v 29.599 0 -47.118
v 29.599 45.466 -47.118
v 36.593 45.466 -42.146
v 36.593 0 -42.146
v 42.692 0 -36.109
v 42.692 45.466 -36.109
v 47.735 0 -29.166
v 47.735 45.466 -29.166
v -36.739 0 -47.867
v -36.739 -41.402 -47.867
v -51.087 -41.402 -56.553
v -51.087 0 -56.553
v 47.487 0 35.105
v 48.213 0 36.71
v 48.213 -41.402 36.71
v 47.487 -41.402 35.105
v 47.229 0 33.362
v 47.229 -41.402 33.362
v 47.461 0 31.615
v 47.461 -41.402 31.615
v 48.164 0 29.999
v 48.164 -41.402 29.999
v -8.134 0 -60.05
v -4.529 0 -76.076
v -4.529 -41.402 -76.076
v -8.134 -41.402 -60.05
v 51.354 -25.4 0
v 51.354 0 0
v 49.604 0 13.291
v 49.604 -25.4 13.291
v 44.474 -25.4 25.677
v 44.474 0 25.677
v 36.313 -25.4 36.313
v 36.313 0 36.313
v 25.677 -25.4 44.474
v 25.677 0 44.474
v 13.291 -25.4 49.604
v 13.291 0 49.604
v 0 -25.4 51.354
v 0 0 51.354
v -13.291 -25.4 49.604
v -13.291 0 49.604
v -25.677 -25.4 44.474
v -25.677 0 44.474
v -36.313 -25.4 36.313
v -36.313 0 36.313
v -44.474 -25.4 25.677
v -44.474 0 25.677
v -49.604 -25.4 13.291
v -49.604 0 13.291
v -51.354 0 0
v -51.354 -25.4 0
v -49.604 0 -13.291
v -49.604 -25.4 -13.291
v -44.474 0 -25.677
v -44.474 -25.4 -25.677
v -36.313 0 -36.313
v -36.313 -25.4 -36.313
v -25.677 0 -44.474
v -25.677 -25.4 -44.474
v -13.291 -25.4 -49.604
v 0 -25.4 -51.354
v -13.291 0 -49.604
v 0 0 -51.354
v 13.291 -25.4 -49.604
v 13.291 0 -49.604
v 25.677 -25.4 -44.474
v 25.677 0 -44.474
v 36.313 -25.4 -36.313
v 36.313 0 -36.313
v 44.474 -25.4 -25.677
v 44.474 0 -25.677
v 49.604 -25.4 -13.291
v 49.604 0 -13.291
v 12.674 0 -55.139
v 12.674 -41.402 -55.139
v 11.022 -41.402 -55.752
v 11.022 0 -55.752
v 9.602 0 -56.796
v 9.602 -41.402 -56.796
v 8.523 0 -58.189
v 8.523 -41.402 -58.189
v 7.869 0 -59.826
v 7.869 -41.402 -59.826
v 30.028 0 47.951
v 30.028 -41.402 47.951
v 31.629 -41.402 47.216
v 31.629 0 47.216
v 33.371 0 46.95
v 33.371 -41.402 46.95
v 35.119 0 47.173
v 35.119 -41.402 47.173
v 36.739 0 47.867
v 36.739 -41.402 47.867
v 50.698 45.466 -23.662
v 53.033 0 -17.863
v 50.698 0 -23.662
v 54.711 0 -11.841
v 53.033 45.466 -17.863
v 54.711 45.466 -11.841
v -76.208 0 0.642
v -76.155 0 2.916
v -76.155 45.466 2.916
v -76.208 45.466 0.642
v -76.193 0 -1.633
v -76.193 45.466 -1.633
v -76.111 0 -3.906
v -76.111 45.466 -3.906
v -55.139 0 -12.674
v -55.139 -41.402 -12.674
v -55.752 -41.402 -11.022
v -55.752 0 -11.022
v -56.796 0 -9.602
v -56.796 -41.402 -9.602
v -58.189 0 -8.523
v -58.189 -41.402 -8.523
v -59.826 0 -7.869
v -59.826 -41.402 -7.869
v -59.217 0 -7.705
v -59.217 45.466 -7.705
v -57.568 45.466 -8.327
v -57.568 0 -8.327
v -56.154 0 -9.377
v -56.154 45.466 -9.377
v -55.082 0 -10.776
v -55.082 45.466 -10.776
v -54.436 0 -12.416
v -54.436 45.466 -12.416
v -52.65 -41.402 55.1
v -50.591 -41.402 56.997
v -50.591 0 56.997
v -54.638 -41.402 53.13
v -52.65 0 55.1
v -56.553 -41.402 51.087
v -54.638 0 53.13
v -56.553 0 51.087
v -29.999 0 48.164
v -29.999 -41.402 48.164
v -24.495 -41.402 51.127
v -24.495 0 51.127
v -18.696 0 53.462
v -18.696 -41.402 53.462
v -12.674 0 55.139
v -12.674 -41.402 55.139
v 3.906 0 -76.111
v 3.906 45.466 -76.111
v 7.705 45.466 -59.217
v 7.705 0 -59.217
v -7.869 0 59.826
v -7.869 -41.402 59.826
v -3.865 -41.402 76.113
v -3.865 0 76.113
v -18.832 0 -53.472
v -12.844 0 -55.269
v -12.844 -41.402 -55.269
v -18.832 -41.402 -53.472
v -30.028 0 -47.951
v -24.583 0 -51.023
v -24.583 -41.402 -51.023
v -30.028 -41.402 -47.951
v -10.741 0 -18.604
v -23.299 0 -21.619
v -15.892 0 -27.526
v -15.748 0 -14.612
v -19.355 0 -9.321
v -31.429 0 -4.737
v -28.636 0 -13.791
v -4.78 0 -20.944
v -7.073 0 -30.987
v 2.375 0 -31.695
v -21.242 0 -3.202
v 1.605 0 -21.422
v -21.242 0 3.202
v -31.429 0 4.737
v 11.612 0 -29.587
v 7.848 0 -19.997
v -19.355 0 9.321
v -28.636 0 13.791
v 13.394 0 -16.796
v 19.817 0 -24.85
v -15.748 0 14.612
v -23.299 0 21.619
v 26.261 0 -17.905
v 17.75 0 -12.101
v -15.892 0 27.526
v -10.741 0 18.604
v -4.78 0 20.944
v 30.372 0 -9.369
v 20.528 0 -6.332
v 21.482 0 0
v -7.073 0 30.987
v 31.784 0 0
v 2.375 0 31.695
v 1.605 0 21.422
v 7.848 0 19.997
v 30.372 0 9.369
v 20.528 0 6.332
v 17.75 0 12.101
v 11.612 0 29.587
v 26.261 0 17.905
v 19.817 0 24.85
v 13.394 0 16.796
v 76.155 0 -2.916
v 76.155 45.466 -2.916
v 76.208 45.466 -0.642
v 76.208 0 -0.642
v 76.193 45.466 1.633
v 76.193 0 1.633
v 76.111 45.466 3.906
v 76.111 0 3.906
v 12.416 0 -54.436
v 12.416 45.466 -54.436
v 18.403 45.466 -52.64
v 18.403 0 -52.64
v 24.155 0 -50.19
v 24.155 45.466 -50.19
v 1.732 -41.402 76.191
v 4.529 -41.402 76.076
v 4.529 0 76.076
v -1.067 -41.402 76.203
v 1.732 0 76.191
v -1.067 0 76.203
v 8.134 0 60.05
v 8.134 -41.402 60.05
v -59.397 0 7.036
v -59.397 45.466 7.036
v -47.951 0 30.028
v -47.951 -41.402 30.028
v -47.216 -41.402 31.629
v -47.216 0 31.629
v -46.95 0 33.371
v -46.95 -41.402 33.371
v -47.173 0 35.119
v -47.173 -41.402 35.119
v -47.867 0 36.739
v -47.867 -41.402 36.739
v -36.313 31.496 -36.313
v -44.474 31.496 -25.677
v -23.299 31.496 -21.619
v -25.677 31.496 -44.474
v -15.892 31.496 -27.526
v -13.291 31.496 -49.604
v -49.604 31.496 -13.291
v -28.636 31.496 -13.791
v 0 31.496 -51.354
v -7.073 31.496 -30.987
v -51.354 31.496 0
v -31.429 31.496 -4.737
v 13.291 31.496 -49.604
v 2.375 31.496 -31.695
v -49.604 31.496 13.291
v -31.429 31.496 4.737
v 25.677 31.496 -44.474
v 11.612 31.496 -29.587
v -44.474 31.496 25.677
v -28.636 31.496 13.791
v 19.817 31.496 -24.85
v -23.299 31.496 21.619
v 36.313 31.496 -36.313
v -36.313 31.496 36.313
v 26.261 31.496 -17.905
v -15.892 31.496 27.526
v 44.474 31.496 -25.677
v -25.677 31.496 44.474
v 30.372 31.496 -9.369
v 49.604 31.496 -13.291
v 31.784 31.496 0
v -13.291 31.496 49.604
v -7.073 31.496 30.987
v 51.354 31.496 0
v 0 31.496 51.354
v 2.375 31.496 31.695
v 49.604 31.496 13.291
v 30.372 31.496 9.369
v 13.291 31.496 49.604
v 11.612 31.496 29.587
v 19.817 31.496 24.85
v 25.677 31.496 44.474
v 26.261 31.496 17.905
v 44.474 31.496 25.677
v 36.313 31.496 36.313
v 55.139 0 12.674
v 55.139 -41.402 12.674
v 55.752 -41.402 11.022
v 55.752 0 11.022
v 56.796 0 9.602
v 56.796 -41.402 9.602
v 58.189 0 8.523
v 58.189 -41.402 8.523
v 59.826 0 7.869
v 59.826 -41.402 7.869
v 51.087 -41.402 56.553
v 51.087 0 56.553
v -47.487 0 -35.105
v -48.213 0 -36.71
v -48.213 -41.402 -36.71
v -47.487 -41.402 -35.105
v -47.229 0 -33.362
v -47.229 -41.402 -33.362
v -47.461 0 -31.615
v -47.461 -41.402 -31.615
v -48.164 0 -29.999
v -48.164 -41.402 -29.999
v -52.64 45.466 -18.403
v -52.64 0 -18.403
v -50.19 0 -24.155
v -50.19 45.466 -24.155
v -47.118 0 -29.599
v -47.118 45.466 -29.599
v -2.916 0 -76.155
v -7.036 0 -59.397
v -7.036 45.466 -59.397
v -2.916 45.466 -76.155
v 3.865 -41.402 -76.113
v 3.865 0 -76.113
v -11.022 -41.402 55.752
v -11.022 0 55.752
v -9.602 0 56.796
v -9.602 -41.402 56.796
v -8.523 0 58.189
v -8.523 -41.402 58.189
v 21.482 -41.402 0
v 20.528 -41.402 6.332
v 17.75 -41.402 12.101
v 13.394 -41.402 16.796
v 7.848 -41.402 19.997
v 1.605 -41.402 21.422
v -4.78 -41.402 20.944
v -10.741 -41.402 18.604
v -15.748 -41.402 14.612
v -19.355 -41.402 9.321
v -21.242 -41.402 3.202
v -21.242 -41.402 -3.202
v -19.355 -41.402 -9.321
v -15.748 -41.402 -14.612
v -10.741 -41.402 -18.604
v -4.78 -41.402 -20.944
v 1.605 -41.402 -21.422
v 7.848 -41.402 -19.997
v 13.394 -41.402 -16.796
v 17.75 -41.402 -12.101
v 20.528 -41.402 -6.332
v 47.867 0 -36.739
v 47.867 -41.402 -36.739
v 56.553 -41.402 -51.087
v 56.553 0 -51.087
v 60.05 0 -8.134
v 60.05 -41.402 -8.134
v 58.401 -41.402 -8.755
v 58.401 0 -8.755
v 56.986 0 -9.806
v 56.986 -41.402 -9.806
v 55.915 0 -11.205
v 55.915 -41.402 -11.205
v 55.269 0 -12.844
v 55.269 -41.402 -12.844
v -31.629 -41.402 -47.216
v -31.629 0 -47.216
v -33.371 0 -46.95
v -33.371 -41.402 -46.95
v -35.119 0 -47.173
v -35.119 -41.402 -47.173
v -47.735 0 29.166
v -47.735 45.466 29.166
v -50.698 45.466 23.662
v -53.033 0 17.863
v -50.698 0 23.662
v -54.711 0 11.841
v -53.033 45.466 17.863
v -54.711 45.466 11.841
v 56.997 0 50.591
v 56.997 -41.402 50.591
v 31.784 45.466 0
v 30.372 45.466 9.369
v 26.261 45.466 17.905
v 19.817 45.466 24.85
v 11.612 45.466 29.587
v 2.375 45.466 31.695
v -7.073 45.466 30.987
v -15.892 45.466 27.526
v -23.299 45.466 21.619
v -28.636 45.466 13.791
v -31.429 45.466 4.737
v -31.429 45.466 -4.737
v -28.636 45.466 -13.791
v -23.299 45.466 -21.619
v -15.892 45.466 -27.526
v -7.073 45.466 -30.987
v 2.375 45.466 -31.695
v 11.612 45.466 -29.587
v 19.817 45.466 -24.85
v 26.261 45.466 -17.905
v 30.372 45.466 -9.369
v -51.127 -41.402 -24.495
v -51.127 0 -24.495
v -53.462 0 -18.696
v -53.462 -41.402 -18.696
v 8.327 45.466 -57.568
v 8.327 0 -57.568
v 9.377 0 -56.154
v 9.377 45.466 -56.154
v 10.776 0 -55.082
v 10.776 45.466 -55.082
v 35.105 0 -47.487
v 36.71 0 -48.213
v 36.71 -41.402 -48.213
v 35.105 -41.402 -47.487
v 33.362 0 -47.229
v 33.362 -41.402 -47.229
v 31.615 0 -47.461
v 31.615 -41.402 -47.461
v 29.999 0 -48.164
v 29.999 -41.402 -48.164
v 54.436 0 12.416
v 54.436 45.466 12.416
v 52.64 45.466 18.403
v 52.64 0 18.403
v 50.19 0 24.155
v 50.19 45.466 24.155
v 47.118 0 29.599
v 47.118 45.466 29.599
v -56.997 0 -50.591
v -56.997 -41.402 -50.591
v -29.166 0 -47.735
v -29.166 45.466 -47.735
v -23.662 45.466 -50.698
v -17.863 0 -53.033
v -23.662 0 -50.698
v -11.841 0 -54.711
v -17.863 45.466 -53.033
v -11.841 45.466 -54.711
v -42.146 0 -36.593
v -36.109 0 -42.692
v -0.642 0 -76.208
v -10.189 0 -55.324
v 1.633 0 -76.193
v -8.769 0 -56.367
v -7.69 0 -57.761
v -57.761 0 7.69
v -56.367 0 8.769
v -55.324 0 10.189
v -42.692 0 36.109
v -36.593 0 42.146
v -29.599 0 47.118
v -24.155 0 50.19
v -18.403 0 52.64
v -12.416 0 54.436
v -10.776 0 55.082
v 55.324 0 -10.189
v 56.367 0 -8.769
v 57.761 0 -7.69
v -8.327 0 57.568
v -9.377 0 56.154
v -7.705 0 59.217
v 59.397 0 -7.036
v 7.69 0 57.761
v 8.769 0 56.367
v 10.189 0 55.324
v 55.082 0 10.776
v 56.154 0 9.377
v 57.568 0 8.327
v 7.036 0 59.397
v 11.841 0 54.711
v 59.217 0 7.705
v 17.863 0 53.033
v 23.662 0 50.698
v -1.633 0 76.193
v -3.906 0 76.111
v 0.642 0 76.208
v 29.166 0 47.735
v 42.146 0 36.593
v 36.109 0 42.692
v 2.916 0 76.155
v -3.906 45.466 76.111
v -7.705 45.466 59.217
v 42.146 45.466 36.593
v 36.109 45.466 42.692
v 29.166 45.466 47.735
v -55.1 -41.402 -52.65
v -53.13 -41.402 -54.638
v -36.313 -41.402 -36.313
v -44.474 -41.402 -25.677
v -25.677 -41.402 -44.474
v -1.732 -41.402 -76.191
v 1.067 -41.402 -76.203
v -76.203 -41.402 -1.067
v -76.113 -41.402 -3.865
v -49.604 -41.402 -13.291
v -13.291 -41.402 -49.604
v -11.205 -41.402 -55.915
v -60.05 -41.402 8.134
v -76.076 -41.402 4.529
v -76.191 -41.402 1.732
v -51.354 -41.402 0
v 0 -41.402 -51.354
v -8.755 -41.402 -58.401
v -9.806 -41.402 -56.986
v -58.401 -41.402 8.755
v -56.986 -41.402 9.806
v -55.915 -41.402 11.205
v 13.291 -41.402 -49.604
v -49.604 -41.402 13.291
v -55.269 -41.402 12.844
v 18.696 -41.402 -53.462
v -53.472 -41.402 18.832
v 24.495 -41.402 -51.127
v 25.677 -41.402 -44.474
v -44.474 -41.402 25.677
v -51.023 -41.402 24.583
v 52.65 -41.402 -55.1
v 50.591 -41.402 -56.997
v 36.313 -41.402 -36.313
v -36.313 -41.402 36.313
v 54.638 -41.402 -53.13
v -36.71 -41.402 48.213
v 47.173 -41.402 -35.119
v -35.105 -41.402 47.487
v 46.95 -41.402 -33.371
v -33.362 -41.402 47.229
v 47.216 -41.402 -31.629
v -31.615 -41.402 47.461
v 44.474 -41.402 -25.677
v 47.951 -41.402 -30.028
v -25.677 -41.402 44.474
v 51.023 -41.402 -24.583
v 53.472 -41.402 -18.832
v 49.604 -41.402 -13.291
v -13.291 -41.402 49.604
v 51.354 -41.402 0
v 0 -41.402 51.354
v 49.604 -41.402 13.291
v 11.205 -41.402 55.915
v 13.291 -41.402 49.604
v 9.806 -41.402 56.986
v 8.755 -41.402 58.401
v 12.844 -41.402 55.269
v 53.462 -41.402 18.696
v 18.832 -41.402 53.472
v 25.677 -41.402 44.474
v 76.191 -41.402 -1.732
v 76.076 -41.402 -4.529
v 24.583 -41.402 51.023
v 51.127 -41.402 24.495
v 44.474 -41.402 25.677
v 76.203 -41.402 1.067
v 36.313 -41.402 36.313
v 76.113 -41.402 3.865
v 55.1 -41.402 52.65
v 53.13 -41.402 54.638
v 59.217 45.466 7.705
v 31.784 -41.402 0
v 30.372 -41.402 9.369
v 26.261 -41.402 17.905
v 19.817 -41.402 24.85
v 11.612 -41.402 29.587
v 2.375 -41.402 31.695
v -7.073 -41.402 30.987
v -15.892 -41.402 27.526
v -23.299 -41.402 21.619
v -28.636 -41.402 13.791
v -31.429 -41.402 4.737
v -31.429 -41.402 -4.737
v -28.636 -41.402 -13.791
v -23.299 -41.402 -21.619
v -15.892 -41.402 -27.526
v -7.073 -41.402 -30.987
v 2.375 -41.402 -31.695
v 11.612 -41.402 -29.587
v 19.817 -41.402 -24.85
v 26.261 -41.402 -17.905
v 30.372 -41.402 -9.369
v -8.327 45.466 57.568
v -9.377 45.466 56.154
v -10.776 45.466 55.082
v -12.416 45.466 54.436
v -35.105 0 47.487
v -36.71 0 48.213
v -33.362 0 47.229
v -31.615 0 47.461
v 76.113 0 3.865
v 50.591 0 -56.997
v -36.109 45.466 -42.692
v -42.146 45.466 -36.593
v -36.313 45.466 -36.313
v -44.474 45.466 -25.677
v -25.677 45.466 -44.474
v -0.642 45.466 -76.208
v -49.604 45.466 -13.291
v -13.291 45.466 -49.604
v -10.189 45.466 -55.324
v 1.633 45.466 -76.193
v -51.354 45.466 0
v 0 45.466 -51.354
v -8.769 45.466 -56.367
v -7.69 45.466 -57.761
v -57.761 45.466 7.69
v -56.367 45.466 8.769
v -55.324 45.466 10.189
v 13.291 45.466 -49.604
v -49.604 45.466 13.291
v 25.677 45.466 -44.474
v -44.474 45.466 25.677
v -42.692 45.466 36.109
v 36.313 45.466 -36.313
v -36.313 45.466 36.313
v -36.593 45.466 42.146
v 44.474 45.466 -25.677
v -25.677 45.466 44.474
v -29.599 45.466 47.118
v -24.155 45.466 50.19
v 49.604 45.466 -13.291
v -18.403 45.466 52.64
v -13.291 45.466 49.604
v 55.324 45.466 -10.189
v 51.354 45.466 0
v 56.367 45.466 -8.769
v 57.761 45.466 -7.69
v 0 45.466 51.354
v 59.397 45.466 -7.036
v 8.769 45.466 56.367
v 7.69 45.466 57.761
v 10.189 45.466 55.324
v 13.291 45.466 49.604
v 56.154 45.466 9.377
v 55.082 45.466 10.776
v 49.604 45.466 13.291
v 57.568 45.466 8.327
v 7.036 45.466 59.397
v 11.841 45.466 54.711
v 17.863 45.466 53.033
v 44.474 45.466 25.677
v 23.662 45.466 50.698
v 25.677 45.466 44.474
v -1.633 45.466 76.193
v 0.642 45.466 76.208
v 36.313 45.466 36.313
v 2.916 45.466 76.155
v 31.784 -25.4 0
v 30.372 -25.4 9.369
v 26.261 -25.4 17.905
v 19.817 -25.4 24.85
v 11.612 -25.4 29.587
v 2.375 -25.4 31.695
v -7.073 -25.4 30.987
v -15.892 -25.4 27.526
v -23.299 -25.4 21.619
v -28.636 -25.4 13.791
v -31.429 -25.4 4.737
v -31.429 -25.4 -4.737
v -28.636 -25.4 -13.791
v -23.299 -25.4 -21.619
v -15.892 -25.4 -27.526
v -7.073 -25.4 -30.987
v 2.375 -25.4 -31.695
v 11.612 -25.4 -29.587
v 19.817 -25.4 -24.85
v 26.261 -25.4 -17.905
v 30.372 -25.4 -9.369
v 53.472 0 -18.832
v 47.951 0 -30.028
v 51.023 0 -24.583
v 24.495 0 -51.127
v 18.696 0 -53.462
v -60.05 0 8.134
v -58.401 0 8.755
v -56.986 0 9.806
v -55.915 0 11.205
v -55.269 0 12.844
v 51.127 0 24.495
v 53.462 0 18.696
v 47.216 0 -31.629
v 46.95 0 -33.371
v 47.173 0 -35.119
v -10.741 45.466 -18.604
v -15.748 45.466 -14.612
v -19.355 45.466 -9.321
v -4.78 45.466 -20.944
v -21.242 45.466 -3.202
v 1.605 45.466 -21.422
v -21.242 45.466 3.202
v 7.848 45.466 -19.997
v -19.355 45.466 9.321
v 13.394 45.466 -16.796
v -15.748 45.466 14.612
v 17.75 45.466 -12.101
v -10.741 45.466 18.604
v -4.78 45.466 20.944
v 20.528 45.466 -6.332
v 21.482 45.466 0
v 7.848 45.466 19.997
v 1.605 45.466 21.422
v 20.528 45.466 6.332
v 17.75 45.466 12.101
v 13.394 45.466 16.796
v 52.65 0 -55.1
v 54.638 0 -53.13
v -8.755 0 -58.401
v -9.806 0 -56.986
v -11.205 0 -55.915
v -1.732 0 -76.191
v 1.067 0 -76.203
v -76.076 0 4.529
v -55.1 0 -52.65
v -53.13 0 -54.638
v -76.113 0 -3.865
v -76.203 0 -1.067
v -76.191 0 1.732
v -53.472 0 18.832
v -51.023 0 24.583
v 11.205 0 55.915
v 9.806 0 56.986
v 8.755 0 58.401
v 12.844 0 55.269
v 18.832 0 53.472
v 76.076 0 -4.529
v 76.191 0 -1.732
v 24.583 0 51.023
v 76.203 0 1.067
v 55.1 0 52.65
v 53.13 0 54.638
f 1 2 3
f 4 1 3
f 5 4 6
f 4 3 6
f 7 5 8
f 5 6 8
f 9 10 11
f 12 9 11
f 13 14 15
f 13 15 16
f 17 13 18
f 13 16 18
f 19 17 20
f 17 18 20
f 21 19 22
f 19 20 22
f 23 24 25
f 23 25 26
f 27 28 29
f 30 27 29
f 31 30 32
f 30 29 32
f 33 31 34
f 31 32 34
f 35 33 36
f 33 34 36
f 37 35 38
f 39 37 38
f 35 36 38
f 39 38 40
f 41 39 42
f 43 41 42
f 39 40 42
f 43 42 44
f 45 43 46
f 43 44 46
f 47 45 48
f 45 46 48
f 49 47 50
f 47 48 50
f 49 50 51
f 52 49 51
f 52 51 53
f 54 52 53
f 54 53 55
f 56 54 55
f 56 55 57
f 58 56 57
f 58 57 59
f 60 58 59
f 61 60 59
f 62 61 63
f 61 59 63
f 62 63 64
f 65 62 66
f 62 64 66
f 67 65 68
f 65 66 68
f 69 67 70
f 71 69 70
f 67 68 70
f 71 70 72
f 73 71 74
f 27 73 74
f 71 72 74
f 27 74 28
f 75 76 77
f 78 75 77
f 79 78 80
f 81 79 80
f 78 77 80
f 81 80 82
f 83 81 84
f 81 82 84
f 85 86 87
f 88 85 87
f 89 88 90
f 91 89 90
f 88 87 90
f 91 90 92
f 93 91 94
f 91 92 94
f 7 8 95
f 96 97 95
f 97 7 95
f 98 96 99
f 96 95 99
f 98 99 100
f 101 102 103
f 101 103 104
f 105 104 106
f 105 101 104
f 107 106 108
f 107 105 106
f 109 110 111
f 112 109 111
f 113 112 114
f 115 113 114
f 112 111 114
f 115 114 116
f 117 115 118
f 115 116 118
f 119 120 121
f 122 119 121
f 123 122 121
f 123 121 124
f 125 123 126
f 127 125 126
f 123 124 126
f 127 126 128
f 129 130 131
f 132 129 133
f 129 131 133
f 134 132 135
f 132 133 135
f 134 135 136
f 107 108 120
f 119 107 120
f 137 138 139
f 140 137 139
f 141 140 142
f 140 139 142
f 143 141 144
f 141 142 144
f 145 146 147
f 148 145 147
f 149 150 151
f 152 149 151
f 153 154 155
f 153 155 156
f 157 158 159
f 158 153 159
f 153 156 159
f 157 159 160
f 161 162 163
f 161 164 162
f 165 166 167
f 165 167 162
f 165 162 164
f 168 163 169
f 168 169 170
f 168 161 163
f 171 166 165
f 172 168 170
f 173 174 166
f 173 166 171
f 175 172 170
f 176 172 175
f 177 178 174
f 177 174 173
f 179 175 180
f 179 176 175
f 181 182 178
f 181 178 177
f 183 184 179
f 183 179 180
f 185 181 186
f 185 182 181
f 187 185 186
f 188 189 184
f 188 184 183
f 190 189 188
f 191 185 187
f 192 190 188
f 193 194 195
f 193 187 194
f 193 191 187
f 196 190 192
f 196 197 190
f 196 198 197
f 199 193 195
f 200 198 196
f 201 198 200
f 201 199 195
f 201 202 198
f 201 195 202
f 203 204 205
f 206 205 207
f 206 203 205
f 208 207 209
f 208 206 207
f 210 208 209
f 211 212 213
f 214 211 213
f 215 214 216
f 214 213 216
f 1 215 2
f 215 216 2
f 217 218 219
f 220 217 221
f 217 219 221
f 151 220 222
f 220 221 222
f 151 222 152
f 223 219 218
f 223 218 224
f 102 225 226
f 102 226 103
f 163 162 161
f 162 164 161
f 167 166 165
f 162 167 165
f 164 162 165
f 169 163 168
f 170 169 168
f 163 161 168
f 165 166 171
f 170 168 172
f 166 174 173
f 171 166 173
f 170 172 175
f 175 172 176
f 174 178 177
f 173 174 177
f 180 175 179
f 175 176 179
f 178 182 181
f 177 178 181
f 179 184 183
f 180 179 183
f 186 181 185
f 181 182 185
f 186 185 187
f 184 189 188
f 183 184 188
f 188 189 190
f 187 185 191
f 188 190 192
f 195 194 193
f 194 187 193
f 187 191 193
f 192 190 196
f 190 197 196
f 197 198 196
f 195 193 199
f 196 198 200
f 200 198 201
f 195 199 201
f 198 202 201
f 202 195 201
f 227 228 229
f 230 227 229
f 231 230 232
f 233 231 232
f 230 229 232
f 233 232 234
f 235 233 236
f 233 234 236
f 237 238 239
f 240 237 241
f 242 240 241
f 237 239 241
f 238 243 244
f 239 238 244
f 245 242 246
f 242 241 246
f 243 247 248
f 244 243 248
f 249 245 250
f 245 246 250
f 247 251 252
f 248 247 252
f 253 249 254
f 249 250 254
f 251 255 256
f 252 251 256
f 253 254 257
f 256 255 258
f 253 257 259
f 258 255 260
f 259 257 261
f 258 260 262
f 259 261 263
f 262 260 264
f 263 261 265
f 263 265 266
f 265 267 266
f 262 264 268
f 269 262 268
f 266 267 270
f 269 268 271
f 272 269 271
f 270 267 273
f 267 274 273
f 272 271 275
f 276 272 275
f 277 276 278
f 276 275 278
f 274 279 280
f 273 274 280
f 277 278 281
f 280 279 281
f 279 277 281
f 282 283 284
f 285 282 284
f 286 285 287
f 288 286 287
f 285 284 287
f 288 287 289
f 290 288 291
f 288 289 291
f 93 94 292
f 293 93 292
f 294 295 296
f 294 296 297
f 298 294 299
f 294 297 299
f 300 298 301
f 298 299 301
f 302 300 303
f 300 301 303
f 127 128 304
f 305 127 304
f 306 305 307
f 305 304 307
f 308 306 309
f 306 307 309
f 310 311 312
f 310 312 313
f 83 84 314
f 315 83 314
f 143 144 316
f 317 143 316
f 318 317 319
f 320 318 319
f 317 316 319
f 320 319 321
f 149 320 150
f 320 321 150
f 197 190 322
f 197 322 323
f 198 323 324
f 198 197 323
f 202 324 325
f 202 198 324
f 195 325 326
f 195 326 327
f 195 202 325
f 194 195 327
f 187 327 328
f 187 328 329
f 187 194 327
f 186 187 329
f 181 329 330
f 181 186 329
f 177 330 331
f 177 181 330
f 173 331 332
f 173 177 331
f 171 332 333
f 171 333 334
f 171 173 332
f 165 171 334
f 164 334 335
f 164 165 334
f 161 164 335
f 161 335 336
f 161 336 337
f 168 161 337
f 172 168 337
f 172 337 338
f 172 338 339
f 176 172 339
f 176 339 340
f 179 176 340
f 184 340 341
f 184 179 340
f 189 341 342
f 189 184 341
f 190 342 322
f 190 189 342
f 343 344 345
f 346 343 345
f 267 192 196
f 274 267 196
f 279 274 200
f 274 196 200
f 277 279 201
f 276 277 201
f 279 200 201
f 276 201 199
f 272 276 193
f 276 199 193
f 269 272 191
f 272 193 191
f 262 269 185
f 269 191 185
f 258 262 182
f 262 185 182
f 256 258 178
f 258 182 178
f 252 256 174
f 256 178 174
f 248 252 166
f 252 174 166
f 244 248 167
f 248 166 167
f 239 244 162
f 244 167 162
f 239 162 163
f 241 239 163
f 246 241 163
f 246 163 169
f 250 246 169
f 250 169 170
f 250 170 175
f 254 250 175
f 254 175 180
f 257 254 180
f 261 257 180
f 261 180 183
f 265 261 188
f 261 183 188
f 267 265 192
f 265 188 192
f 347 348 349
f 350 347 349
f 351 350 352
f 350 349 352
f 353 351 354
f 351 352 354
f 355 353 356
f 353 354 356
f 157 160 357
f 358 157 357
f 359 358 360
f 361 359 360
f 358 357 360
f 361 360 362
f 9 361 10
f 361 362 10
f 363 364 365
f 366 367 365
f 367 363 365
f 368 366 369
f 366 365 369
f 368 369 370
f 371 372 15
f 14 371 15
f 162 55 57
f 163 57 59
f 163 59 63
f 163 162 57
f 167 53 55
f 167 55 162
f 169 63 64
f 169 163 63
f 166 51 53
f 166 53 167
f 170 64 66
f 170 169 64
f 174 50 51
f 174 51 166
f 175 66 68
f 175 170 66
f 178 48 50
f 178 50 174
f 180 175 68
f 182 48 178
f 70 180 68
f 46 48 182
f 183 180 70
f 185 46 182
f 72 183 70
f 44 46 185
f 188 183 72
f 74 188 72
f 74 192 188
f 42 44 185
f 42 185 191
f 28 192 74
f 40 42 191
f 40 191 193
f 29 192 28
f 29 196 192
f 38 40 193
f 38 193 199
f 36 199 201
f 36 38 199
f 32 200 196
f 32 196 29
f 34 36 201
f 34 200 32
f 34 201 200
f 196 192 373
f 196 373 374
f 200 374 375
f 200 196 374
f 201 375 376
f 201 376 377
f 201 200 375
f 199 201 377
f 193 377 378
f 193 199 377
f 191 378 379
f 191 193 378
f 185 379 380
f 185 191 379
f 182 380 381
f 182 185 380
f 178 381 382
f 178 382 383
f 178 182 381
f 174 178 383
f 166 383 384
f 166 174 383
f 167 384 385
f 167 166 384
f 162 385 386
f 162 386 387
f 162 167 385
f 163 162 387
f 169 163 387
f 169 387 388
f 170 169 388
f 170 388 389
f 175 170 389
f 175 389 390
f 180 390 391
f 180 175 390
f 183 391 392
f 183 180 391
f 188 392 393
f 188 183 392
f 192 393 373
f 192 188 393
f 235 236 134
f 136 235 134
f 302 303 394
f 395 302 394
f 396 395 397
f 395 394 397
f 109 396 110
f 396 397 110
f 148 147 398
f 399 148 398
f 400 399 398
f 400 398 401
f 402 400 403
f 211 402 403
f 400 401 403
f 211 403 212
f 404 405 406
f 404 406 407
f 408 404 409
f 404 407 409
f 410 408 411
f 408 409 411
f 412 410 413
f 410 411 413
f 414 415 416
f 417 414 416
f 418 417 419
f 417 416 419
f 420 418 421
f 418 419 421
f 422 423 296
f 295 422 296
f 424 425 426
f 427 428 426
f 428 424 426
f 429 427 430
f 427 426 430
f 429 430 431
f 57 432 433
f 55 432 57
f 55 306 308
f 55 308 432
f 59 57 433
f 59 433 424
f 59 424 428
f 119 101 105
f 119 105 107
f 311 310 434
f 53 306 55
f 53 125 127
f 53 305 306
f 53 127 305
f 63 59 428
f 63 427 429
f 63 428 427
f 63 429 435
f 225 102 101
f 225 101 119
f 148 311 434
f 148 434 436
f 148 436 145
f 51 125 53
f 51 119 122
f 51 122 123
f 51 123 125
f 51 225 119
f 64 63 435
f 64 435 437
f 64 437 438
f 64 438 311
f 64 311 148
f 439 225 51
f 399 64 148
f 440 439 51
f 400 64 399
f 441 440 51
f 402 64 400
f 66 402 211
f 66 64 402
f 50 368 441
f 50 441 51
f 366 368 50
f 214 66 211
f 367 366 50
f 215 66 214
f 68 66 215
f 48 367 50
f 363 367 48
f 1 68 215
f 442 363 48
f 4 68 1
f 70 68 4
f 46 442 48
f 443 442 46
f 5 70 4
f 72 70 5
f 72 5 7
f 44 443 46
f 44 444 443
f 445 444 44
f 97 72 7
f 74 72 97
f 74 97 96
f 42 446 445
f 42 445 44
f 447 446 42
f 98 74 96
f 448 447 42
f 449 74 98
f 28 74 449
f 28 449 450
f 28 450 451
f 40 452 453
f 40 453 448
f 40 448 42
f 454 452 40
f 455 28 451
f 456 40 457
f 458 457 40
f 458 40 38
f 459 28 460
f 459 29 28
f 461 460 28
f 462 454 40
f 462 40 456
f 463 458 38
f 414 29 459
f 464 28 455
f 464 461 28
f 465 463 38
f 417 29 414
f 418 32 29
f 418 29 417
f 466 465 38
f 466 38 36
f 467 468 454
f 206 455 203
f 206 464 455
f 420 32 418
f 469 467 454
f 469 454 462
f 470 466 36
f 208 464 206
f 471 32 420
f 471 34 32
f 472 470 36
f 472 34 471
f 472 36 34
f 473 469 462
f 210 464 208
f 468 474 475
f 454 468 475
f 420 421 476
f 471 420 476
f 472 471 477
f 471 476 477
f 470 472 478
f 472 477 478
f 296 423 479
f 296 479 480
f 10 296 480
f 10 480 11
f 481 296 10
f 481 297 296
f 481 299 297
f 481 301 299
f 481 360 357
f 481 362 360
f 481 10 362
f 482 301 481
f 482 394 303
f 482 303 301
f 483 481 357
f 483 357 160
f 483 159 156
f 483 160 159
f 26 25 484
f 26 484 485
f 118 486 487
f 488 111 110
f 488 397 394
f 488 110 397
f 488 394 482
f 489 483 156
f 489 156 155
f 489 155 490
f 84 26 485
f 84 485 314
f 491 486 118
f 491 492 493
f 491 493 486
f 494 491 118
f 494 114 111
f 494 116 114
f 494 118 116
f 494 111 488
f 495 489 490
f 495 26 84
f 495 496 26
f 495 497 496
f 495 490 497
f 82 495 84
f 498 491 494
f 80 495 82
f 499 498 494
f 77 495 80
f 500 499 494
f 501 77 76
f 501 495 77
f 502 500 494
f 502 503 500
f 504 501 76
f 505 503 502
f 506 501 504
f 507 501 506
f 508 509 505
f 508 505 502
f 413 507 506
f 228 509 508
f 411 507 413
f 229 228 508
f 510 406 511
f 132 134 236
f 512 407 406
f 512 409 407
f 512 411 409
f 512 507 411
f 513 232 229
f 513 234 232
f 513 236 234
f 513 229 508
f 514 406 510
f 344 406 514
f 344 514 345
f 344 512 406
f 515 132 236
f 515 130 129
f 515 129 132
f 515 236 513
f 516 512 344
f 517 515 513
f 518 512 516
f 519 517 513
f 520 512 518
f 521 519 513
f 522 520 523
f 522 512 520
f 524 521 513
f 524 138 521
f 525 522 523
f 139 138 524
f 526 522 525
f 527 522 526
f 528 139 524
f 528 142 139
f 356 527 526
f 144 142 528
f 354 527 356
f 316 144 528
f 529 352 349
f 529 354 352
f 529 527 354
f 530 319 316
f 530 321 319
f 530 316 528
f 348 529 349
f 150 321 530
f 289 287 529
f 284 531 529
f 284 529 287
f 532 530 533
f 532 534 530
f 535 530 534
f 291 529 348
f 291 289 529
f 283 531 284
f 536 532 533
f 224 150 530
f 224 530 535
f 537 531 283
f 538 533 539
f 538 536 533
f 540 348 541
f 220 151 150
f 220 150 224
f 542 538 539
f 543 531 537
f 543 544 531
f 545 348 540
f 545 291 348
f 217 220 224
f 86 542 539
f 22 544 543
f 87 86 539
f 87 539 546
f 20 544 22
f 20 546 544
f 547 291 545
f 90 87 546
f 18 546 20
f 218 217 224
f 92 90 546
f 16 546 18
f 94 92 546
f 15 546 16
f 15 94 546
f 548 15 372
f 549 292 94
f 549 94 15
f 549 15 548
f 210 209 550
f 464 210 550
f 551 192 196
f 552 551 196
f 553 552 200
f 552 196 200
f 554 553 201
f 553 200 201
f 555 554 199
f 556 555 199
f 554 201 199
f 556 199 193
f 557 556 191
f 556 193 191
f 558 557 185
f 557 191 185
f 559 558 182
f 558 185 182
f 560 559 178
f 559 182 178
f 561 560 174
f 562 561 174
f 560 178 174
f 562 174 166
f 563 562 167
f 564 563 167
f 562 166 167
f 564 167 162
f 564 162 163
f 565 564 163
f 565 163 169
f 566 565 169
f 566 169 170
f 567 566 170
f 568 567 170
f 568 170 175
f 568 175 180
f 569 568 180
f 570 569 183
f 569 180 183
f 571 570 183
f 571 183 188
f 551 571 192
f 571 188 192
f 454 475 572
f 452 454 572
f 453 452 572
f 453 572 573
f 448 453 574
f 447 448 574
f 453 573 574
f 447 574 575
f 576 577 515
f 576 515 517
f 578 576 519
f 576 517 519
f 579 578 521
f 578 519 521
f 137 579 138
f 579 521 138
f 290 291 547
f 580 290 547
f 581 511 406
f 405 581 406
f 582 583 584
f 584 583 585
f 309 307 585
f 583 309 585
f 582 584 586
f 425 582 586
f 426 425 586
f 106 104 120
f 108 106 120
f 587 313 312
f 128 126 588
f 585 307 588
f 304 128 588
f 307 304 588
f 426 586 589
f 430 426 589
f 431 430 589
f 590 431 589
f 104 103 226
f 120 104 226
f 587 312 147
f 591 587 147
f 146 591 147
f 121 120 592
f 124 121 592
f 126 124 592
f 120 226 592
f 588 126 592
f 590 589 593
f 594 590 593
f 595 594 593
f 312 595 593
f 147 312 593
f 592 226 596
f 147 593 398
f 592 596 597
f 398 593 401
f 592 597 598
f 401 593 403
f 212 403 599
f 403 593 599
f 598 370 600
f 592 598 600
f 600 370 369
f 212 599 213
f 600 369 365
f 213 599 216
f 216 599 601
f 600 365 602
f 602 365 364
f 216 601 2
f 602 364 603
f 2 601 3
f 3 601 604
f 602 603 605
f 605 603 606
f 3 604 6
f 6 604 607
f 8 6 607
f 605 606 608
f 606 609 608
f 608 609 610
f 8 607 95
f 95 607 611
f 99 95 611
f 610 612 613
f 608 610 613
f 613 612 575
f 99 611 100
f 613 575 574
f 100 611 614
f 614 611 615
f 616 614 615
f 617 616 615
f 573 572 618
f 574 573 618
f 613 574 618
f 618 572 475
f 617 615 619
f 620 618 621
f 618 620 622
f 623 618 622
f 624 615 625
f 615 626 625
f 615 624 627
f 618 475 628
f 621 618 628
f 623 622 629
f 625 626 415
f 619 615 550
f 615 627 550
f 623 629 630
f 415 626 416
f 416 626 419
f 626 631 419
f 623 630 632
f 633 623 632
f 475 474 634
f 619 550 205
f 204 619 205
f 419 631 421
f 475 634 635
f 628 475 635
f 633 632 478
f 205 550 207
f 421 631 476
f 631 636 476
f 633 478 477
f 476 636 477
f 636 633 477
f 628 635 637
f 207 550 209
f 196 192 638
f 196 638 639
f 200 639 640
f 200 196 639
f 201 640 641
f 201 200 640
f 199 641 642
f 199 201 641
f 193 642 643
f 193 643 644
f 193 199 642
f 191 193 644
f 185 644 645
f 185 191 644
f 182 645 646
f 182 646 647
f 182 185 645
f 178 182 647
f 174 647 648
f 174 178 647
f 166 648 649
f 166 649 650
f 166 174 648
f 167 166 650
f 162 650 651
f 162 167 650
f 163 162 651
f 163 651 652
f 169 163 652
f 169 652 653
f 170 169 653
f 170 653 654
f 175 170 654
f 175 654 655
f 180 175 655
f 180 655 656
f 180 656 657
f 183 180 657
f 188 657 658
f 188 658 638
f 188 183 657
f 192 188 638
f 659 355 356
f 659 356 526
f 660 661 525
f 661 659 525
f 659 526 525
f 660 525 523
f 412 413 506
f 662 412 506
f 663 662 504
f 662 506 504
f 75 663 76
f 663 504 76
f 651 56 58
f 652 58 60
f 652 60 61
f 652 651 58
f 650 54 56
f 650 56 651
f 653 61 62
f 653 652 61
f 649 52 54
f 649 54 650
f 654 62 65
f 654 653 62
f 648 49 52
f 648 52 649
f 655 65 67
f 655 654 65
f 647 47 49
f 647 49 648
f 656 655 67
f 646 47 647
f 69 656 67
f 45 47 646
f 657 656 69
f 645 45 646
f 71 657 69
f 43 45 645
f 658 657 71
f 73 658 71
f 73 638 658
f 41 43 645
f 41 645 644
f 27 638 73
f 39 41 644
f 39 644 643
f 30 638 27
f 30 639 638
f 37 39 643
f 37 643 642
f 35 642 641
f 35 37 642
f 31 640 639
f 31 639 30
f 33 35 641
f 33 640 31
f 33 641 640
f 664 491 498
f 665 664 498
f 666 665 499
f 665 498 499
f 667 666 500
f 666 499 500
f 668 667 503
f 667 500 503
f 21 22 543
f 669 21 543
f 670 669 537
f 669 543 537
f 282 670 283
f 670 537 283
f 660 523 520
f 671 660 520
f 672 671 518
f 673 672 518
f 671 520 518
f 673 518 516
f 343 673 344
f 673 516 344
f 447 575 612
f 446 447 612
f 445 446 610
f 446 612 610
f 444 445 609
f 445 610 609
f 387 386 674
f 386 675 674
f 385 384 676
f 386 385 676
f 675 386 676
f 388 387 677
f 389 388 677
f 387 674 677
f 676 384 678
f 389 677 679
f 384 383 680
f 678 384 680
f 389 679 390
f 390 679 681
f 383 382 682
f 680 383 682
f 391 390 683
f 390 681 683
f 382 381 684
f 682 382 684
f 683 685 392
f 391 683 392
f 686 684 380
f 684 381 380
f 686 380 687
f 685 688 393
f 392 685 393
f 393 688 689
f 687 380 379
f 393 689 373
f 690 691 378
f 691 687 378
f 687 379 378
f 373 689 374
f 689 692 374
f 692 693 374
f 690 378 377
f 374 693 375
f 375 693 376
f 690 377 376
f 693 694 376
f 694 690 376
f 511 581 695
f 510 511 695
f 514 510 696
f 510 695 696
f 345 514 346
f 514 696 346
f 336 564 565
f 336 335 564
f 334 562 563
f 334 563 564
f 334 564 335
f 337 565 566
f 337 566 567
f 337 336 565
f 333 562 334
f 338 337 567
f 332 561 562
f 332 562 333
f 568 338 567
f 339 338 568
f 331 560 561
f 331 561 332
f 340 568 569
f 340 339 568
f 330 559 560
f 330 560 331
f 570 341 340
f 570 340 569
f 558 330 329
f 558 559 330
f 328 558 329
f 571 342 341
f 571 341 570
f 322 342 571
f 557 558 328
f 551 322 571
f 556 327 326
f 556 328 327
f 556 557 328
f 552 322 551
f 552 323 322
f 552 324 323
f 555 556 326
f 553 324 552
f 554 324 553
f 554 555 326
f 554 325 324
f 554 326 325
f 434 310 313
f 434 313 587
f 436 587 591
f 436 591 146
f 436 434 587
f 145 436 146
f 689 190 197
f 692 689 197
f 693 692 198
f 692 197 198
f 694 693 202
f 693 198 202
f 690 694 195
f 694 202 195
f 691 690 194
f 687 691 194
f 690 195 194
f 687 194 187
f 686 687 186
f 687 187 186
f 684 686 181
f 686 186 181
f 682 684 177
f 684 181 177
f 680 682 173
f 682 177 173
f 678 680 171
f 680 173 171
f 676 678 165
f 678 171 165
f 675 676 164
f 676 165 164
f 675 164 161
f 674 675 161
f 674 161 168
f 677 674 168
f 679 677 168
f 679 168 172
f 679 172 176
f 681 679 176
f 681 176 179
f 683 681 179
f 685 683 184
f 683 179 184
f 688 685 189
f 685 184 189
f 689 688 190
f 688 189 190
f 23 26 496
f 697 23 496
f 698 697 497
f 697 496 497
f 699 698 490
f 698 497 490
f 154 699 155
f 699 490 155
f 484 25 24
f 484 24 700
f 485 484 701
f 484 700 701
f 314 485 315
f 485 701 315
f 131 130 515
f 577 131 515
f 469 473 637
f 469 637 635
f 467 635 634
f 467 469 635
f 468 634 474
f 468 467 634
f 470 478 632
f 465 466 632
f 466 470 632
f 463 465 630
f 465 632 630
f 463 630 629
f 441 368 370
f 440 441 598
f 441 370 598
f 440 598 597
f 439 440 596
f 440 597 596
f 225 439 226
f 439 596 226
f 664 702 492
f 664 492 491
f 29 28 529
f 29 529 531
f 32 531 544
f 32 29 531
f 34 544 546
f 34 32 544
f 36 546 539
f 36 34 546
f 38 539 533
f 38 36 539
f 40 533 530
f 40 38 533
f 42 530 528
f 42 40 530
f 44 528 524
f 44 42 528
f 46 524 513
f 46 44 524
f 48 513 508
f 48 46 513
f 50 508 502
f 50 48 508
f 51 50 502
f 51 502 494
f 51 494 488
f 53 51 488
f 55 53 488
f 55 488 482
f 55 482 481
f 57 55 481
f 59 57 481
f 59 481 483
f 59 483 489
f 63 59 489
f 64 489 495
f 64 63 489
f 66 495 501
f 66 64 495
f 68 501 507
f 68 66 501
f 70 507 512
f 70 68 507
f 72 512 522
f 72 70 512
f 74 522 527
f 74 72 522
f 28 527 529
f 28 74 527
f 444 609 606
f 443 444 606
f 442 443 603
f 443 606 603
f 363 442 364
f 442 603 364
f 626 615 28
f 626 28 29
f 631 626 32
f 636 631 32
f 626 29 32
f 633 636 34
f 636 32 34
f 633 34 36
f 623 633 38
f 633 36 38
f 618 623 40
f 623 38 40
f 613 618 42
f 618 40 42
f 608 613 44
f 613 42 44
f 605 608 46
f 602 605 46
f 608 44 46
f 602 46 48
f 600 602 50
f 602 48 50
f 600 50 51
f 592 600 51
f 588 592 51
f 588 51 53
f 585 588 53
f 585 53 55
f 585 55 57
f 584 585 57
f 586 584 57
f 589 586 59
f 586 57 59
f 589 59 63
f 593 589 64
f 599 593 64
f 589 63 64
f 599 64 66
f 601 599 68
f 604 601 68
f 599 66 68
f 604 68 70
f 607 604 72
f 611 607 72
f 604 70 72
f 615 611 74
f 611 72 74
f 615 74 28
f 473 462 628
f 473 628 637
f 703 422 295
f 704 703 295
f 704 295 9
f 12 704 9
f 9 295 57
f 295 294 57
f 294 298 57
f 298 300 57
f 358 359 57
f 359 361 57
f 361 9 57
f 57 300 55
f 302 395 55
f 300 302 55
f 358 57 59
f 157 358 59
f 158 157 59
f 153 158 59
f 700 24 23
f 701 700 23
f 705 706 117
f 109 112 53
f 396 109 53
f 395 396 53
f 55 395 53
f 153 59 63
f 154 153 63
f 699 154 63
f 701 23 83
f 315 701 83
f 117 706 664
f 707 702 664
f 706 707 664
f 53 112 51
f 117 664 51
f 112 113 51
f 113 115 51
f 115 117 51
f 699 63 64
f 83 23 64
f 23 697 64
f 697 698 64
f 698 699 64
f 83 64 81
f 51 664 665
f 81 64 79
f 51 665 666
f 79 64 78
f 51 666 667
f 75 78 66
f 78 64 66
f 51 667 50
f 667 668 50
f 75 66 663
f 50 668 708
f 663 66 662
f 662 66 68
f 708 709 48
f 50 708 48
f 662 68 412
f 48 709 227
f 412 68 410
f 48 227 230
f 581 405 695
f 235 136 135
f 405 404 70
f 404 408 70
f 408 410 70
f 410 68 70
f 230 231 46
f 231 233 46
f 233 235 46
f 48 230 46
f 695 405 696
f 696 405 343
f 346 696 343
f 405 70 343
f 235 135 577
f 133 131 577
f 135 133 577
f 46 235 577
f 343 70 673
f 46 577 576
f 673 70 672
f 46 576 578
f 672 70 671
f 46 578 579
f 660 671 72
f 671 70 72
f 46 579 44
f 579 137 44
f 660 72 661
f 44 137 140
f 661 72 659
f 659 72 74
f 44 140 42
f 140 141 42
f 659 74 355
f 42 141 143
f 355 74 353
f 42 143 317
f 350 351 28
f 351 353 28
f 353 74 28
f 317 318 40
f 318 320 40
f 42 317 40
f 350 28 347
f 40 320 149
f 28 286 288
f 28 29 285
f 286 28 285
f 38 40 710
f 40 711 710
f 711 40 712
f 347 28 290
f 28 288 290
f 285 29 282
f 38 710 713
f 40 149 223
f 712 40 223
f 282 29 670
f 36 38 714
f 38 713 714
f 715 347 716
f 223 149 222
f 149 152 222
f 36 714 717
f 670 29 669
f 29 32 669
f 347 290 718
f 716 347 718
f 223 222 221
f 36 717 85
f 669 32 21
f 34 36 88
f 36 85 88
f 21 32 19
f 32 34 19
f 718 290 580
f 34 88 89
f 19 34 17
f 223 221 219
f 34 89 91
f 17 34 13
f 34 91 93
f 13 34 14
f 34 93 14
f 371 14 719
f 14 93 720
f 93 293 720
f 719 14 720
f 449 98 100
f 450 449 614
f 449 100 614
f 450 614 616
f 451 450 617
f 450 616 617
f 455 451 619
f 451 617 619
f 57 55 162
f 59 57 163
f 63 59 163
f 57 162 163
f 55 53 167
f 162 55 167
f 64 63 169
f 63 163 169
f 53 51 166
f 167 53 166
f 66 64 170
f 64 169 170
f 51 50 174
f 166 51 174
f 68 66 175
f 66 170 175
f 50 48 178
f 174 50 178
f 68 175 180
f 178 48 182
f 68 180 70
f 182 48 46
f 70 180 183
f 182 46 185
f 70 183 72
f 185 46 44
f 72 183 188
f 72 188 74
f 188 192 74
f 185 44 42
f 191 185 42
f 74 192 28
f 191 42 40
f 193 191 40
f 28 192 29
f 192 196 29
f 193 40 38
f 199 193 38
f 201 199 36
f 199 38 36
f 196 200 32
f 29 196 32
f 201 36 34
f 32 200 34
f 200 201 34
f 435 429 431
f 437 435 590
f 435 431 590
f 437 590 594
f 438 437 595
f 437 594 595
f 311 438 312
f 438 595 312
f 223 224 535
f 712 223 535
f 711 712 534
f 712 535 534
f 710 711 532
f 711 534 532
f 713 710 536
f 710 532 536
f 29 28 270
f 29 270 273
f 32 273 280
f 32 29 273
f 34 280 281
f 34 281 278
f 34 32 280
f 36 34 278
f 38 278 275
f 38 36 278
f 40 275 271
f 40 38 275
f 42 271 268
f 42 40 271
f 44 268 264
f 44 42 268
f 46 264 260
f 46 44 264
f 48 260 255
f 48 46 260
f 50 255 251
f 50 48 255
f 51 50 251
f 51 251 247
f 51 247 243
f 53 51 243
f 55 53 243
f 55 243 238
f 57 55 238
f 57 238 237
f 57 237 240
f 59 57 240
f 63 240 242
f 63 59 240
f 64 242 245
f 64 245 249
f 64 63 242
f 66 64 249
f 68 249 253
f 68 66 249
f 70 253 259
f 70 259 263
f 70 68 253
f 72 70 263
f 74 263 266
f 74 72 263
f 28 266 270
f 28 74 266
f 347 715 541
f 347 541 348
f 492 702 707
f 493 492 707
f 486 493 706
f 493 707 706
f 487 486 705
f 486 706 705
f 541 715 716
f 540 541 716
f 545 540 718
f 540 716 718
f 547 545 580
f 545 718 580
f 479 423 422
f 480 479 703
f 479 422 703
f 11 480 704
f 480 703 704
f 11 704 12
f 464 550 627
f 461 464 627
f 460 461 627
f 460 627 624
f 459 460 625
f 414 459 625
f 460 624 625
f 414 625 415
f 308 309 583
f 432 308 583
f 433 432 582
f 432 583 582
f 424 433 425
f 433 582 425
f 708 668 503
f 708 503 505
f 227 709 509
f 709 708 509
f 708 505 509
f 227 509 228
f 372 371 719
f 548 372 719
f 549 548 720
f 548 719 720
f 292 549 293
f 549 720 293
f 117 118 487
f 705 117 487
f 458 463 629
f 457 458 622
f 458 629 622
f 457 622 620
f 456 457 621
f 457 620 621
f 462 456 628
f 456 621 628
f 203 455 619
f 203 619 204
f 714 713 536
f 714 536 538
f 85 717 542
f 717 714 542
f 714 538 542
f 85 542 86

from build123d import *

# Parameters (mm, degrees)
F0_R     = 76.2109388573
F0_R_2   = 51.3540335205
F1_DEPTH = 41.402
F0_R_3   = 31.7840451581
F0_R_4   = 21.4823406774
F2_DEPTH = 25.4
F4_DEPTH = 71.882
F5_DEPTH = 45.466
F6_DEPTH = 31.496
F8_DEPTH = 51.054


with BuildPart() as f1:
    # F0 (on Front) → F1 (new body)
    with BuildSketch(Plane.XZ):
        Circle(F0_R)
        Circle(F0_R_2, mode=Mode.SUBTRACT)
    extrude(amount=F1_DEPTH)

    # F3 (on face) → F4 (cut)
    with BuildSketch(Plane.XZ.offset(41.402)):
        with BuildLine():
            Line((-47.8672647572, 36.7388077798), (-56.5527223926, 51.0871489857))
            ThreePointArc((-56.5527223926, 51.0871489857), (-70.2816834344, 29.4718878788), (-76.0762226062, 4.529410059))
            Line((-76.0762226062, 4.529410059), (-60.0498225812, 8.1337879145))
            ThreePointArc((-60.0498225812, 8.1337879145), (-56.9862917555, 9.8058862302), (-55.2691454533, 12.8443961405))
            ThreePointArc((-55.2691454533, 12.8443961405), (-52.3275453278, 21.741673907), (-47.9509285541, 30.0277941433))
            ThreePointArc((-47.9509285541, 30.0277941433), (-46.9500267793, 33.3713445818), (-47.8672647572, 36.7388077798))
        make_face()
        with BuildLine():
            Line((-7.8690073929, 59.8255276205), (-3.8647440191, 76.1128829777))
            ThreePointArc((-3.8647440191, 76.1128829777), (-28.8568831762, 70.5364267231), (-50.5912363244, 56.9967894593))
            Line((-50.5912363244, 56.9967894593), (-36.7101801652, 48.2130933472))
            ThreePointArc((-36.7101801652, 48.2130933472), (-33.361584686, 47.2292019839), (-29.9988279292, 48.1635471516))
            ThreePointArc((-29.9988279292, 48.1635471516), (-21.6274770901, 52.3748471981), (-12.673569882, 55.1392836076))
            ThreePointArc((-12.673569882, 55.1392836076), (-9.6015782614, 56.7957863637), (-7.8690073929, 59.8255276205))
        make_face()
        with BuildLine():
            ThreePointArc((51.0871489857, 56.5527223926), (29.4718878788, 70.2816834344), (4.529410059, 76.0762226062))
            Line((4.529410059, 76.0762226062), (8.1337879145, 60.0498225812))
            ThreePointArc((8.1337879145, 60.0498225812), (9.8058862302, 56.9862917555), (12.8443961405, 55.2691454533))
            ThreePointArc((12.8443961405, 55.2691454533), (21.741673907, 52.3275453278), (30.0277941433, 47.9509285541))
            ThreePointArc((30.0277941433, 47.9509285541), (33.3713445818, 46.9500267793), (36.7388077798, 47.8672647572))
            Line((36.7388077798, 47.8672647572), (51.0871489857, 56.5527223926))
        make_face()
        with BuildLine():
            ThreePointArc((76.1128829777, 3.8647440191), (70.5364267231, 28.8568831762), (56.9967894593, 50.5912363244))
            Line((56.9967894593, 50.5912363244), (48.2130933472, 36.7101801652))
            ThreePointArc((48.2130933472, 36.7101801652), (47.2292019839, 33.361584686), (48.1635471516, 29.9988279292))
            ThreePointArc((48.1635471516, 29.9988279292), (52.3748471981, 21.6274770901), (55.1392836076, 12.673569882))
            ThreePointArc((55.1392836076, 12.673569882), (56.7957863637, 9.6015782614), (59.8255276205, 7.8690073929))
            Line((59.8255276205, 7.8690073929), (76.1128829777, 3.8647440191))
        make_face()
        with BuildLine():
            ThreePointArc((56.5527223926, -51.0871489857), (70.2816834344, -29.4718878788), (76.0762226062, -4.529410059))
            Line((76.0762226062, -4.529410059), (60.0498225812, -8.1337879145))
            ThreePointArc((60.0498225812, -8.1337879145), (56.9862917555, -9.8058862302), (55.2691454533, -12.8443961405))
            ThreePointArc((55.2691454533, -12.8443961405), (52.3275453278, -21.741673907), (47.9509285541, -30.0277941433))
            ThreePointArc((47.9509285541, -30.0277941433), (46.9500267793, -33.3713445818), (47.8672647572, -36.7388077798))
            Line((47.8672647572, -36.7388077798), (56.5527223926, -51.0871489857))
        make_face()
        with BuildLine():
            ThreePointArc((3.8647440191, -76.1128829777), (28.8568831762, -70.5364267231), (50.5912363244, -56.9967894593))
            Line((50.5912363244, -56.9967894593), (36.7101801652, -48.2130933472))
            ThreePointArc((36.7101801652, -48.2130933472), (33.361584686, -47.2292019839), (29.9988279292, -48.1635471516))
            ThreePointArc((29.9988279292, -48.1635471516), (21.6274770901, -52.3748471981), (12.673569882, -55.1392836076))
            ThreePointArc((12.673569882, -55.1392836076), (9.6015782614, -56.7957863637), (7.8690073929, -59.8255276205))
            Line((7.8690073929, -59.8255276205), (3.8647440191, -76.1128829777))
        make_face()
        with BuildLine():
            Line((-36.7388077798, -47.8672647572), (-51.0871489857, -56.5527223926))
            ThreePointArc((-51.0871489857, -56.5527223926), (-29.4718878788, -70.2816834344), (-4.529410059, -76.0762226062))
            Line((-4.529410059, -76.0762226062), (-8.1337879145, -60.0498225812))
            ThreePointArc((-8.1337879145, -60.0498225812), (-9.8058862302, -56.9862917555), (-12.8443961405, -55.2691454533))
            ThreePointArc((-12.8443961405, -55.2691454533), (-21.741673907, -52.3275453278), (-30.0277941433, -47.9509285541))
            ThreePointArc((-30.0277941433, -47.9509285541), (-33.3713445818, -46.9500267793), (-36.7388077798, -47.8672647572))
        make_face()
        with BuildLine():
            Line((-59.8255276205, -7.8690073929), (-76.1128829777, -3.8647440191))
            ThreePointArc((-76.1128829777, -3.8647440191), (-70.5364267231, -28.8568831762), (-56.9967894593, -50.5912363244))
            Line((-56.9967894593, -50.5912363244), (-48.2130933472, -36.7101801652))
            ThreePointArc((-48.2130933472, -36.7101801652), (-47.2292019839, -33.361584686), (-48.1635471516, -29.9988279292))
            ThreePointArc((-48.1635471516, -29.9988279292), (-52.3748471981, -21.6274770901), (-55.1392836076, -12.673569882))
            ThreePointArc((-55.1392836076, -12.673569882), (-56.7957863637, -9.6015782614), (-59.8255276205, -7.8690073929))
        make_face()
    extrude(amount=-F4_DEPTH, mode=Mode.SUBTRACT)


with BuildPart() as f1b:
    # F0 (on Front) → F1, piece 2 (new body)
    with BuildSketch(Plane.XZ):
        Circle(F0_R_3)
        Circle(F0_R_4, mode=Mode.SUBTRACT)
    extrude(amount=F1_DEPTH)


with BuildPart() as f2:
    # F0 (on Front) → F2 (new body)
    with BuildSketch(Plane.XZ):
        Circle(F0_R_2)
        Circle(F0_R_3, mode=Mode.SUBTRACT)
    extrude(amount=F2_DEPTH)


with BuildPart() as f5:
    # F0 (on Front) → F5 (new body)
    with BuildSketch(Plane.XZ):
        Circle(F0_R_3)
        Circle(F0_R_4, mode=Mode.SUBTRACT)
    extrude(amount=-F5_DEPTH)


with BuildPart() as f5b:
    # F0 (on Front) → F5, piece 2 (new body)
    with BuildSketch(Plane.XZ):
        Circle(F0_R)
        Circle(F0_R_2, mode=Mode.SUBTRACT)
    extrude(amount=-F5_DEPTH)

    # F7 (on face) → F8 (cut)
    with BuildSketch(Plane(origin=(0, 45.466, 0), x_dir=(-1, 0, 0), z_dir=(0, 1, 0))):
        with BuildLine():
            ThreePointArc((-47.1182366423, 29.5992543095), (-39.2509800473, 39.7646962899), (-29.1661360175, 47.7350073178))
            ThreePointArc((-29.1661360175, 47.7350073178), (-20.7947851783, 51.9463073643), (-11.8408779702, 54.7107437738))
            ThreePointArc((-11.8408779702, 54.7107437738), (-8.7688863497, 56.3672465299), (-7.0363154811, 59.3969877867))
            Line((-7.0363154811, 59.3969877867), (-2.9163110774, 76.1551201903))
            ThreePointArc((-2.9163110774, 76.1551201903), (-53.5379377777, 54.2383298048), (-76.1107860532, 3.9058223039))
            Line((-76.1107860532, 3.9058223039), (-59.2171306694, 7.7052480807))
            ThreePointArc((-59.2171306694, 7.7052480807), (-56.1535998437, 9.3773463964), (-54.4364535416, 12.4158563067))
            ThreePointArc((-54.4364535416, 12.4158563067), (-51.494853416, 21.3131340732), (-47.1182366423, 29.5992543095))
        make_face()
        with BuildLine():
            ThreePointArc((76.1551201903, 2.9163110774), (54.2383298048, 53.5379377777), (3.9058223039, 76.1107860532))
            Line((3.9058223039, 76.1107860532), (7.7052480807, 59.2171306694))
            ThreePointArc((7.7052480807, 59.2171306694), (9.3773463964, 56.1535998437), (12.4158563067, 54.4364535416))
            ThreePointArc((12.4158563067, 54.4364535416), (21.3131340732, 51.494853416), (29.5992543095, 47.1182366423))
            ThreePointArc((29.5992543095, 47.1182366423), (39.7646962899, 39.2509800473), (47.7350073178, 29.1661360175))
            ThreePointArc((47.7350073178, 29.1661360175), (51.9463073643, 20.7947851783), (54.7107437738, 11.8408779702))
            ThreePointArc((54.7107437738, 11.8408779702), (56.3672465299, 8.7688863497), (59.3969877867, 7.0363154811))
            Line((59.3969877867, 7.0363154811), (76.1551201903, 2.9163110774))
        make_face()
        with BuildLine():
            ThreePointArc((2.9163110774, -76.1551201903), (53.5379377777, -54.2383298048), (76.1107860532, -3.9058223039))
            Line((76.1107860532, -3.9058223039), (59.2171306694, -7.7052480807))
            ThreePointArc((59.2171306694, -7.7052480807), (56.1535998437, -9.3773463964), (54.4364535416, -12.4158563067))
            ThreePointArc((54.4364535416, -12.4158563067), (51.494853416, -21.3131340732), (47.1182366423, -29.5992543095))
            ThreePointArc((47.1182366423, -29.5992543095), (39.2509800473, -39.7646962899), (29.1661360175, -47.7350073178))
            ThreePointArc((29.1661360175, -47.7350073178), (20.7947851783, -51.9463073643), (11.8408779702, -54.7107437738))
            ThreePointArc((11.8408779702, -54.7107437738), (8.7688863497, -56.3672465299), (7.0363154811, -59.3969877867))
            Line((7.0363154811, -59.3969877867), (2.9163110774, -76.1551201903))
        make_face()
        with BuildLine():
            Line((-59.3969877867, -7.0363154811), (-76.1551201903, -2.9163110774))
            ThreePointArc((-76.1551201903, -2.9163110774), (-54.2383298048, -53.5379377777), (-3.9058223039, -76.1107860532))
            Line((-3.9058223039, -76.1107860532), (-7.7052480807, -59.2171306694))
            ThreePointArc((-7.7052480807, -59.2171306694), (-9.3773463964, -56.1535998437), (-12.4158563067, -54.4364535416))
            ThreePointArc((-12.4158563067, -54.4364535416), (-21.3131340732, -51.494853416), (-29.5992543095, -47.1182366423))
            ThreePointArc((-29.5992543095, -47.1182366423), (-39.7646962899, -39.2509800473), (-47.7350073178, -29.1661360175))
            ThreePointArc((-47.7350073178, -29.1661360175), (-51.9463073643, -20.7947851783), (-54.7107437738, -11.8408779702))
            ThreePointArc((-54.7107437738, -11.8408779702), (-56.3672465299, -8.7688863497), (-59.3969877867, -7.0363154811))
        make_face()
    extrude(amount=-F8_DEPTH, mode=Mode.SUBTRACT)


with BuildPart() as f6:
    # F0 (on Front) → F6 (new body)
    with BuildSketch(Plane.XZ):
        Circle(F0_R_2)
        Circle(F0_R_3, mode=Mode.SUBTRACT)
    extrude(amount=-F6_DEPTH)


solid = Compound([f1.part, f1b.part, f2.part, f5.part, f5b.part, f6.part])
